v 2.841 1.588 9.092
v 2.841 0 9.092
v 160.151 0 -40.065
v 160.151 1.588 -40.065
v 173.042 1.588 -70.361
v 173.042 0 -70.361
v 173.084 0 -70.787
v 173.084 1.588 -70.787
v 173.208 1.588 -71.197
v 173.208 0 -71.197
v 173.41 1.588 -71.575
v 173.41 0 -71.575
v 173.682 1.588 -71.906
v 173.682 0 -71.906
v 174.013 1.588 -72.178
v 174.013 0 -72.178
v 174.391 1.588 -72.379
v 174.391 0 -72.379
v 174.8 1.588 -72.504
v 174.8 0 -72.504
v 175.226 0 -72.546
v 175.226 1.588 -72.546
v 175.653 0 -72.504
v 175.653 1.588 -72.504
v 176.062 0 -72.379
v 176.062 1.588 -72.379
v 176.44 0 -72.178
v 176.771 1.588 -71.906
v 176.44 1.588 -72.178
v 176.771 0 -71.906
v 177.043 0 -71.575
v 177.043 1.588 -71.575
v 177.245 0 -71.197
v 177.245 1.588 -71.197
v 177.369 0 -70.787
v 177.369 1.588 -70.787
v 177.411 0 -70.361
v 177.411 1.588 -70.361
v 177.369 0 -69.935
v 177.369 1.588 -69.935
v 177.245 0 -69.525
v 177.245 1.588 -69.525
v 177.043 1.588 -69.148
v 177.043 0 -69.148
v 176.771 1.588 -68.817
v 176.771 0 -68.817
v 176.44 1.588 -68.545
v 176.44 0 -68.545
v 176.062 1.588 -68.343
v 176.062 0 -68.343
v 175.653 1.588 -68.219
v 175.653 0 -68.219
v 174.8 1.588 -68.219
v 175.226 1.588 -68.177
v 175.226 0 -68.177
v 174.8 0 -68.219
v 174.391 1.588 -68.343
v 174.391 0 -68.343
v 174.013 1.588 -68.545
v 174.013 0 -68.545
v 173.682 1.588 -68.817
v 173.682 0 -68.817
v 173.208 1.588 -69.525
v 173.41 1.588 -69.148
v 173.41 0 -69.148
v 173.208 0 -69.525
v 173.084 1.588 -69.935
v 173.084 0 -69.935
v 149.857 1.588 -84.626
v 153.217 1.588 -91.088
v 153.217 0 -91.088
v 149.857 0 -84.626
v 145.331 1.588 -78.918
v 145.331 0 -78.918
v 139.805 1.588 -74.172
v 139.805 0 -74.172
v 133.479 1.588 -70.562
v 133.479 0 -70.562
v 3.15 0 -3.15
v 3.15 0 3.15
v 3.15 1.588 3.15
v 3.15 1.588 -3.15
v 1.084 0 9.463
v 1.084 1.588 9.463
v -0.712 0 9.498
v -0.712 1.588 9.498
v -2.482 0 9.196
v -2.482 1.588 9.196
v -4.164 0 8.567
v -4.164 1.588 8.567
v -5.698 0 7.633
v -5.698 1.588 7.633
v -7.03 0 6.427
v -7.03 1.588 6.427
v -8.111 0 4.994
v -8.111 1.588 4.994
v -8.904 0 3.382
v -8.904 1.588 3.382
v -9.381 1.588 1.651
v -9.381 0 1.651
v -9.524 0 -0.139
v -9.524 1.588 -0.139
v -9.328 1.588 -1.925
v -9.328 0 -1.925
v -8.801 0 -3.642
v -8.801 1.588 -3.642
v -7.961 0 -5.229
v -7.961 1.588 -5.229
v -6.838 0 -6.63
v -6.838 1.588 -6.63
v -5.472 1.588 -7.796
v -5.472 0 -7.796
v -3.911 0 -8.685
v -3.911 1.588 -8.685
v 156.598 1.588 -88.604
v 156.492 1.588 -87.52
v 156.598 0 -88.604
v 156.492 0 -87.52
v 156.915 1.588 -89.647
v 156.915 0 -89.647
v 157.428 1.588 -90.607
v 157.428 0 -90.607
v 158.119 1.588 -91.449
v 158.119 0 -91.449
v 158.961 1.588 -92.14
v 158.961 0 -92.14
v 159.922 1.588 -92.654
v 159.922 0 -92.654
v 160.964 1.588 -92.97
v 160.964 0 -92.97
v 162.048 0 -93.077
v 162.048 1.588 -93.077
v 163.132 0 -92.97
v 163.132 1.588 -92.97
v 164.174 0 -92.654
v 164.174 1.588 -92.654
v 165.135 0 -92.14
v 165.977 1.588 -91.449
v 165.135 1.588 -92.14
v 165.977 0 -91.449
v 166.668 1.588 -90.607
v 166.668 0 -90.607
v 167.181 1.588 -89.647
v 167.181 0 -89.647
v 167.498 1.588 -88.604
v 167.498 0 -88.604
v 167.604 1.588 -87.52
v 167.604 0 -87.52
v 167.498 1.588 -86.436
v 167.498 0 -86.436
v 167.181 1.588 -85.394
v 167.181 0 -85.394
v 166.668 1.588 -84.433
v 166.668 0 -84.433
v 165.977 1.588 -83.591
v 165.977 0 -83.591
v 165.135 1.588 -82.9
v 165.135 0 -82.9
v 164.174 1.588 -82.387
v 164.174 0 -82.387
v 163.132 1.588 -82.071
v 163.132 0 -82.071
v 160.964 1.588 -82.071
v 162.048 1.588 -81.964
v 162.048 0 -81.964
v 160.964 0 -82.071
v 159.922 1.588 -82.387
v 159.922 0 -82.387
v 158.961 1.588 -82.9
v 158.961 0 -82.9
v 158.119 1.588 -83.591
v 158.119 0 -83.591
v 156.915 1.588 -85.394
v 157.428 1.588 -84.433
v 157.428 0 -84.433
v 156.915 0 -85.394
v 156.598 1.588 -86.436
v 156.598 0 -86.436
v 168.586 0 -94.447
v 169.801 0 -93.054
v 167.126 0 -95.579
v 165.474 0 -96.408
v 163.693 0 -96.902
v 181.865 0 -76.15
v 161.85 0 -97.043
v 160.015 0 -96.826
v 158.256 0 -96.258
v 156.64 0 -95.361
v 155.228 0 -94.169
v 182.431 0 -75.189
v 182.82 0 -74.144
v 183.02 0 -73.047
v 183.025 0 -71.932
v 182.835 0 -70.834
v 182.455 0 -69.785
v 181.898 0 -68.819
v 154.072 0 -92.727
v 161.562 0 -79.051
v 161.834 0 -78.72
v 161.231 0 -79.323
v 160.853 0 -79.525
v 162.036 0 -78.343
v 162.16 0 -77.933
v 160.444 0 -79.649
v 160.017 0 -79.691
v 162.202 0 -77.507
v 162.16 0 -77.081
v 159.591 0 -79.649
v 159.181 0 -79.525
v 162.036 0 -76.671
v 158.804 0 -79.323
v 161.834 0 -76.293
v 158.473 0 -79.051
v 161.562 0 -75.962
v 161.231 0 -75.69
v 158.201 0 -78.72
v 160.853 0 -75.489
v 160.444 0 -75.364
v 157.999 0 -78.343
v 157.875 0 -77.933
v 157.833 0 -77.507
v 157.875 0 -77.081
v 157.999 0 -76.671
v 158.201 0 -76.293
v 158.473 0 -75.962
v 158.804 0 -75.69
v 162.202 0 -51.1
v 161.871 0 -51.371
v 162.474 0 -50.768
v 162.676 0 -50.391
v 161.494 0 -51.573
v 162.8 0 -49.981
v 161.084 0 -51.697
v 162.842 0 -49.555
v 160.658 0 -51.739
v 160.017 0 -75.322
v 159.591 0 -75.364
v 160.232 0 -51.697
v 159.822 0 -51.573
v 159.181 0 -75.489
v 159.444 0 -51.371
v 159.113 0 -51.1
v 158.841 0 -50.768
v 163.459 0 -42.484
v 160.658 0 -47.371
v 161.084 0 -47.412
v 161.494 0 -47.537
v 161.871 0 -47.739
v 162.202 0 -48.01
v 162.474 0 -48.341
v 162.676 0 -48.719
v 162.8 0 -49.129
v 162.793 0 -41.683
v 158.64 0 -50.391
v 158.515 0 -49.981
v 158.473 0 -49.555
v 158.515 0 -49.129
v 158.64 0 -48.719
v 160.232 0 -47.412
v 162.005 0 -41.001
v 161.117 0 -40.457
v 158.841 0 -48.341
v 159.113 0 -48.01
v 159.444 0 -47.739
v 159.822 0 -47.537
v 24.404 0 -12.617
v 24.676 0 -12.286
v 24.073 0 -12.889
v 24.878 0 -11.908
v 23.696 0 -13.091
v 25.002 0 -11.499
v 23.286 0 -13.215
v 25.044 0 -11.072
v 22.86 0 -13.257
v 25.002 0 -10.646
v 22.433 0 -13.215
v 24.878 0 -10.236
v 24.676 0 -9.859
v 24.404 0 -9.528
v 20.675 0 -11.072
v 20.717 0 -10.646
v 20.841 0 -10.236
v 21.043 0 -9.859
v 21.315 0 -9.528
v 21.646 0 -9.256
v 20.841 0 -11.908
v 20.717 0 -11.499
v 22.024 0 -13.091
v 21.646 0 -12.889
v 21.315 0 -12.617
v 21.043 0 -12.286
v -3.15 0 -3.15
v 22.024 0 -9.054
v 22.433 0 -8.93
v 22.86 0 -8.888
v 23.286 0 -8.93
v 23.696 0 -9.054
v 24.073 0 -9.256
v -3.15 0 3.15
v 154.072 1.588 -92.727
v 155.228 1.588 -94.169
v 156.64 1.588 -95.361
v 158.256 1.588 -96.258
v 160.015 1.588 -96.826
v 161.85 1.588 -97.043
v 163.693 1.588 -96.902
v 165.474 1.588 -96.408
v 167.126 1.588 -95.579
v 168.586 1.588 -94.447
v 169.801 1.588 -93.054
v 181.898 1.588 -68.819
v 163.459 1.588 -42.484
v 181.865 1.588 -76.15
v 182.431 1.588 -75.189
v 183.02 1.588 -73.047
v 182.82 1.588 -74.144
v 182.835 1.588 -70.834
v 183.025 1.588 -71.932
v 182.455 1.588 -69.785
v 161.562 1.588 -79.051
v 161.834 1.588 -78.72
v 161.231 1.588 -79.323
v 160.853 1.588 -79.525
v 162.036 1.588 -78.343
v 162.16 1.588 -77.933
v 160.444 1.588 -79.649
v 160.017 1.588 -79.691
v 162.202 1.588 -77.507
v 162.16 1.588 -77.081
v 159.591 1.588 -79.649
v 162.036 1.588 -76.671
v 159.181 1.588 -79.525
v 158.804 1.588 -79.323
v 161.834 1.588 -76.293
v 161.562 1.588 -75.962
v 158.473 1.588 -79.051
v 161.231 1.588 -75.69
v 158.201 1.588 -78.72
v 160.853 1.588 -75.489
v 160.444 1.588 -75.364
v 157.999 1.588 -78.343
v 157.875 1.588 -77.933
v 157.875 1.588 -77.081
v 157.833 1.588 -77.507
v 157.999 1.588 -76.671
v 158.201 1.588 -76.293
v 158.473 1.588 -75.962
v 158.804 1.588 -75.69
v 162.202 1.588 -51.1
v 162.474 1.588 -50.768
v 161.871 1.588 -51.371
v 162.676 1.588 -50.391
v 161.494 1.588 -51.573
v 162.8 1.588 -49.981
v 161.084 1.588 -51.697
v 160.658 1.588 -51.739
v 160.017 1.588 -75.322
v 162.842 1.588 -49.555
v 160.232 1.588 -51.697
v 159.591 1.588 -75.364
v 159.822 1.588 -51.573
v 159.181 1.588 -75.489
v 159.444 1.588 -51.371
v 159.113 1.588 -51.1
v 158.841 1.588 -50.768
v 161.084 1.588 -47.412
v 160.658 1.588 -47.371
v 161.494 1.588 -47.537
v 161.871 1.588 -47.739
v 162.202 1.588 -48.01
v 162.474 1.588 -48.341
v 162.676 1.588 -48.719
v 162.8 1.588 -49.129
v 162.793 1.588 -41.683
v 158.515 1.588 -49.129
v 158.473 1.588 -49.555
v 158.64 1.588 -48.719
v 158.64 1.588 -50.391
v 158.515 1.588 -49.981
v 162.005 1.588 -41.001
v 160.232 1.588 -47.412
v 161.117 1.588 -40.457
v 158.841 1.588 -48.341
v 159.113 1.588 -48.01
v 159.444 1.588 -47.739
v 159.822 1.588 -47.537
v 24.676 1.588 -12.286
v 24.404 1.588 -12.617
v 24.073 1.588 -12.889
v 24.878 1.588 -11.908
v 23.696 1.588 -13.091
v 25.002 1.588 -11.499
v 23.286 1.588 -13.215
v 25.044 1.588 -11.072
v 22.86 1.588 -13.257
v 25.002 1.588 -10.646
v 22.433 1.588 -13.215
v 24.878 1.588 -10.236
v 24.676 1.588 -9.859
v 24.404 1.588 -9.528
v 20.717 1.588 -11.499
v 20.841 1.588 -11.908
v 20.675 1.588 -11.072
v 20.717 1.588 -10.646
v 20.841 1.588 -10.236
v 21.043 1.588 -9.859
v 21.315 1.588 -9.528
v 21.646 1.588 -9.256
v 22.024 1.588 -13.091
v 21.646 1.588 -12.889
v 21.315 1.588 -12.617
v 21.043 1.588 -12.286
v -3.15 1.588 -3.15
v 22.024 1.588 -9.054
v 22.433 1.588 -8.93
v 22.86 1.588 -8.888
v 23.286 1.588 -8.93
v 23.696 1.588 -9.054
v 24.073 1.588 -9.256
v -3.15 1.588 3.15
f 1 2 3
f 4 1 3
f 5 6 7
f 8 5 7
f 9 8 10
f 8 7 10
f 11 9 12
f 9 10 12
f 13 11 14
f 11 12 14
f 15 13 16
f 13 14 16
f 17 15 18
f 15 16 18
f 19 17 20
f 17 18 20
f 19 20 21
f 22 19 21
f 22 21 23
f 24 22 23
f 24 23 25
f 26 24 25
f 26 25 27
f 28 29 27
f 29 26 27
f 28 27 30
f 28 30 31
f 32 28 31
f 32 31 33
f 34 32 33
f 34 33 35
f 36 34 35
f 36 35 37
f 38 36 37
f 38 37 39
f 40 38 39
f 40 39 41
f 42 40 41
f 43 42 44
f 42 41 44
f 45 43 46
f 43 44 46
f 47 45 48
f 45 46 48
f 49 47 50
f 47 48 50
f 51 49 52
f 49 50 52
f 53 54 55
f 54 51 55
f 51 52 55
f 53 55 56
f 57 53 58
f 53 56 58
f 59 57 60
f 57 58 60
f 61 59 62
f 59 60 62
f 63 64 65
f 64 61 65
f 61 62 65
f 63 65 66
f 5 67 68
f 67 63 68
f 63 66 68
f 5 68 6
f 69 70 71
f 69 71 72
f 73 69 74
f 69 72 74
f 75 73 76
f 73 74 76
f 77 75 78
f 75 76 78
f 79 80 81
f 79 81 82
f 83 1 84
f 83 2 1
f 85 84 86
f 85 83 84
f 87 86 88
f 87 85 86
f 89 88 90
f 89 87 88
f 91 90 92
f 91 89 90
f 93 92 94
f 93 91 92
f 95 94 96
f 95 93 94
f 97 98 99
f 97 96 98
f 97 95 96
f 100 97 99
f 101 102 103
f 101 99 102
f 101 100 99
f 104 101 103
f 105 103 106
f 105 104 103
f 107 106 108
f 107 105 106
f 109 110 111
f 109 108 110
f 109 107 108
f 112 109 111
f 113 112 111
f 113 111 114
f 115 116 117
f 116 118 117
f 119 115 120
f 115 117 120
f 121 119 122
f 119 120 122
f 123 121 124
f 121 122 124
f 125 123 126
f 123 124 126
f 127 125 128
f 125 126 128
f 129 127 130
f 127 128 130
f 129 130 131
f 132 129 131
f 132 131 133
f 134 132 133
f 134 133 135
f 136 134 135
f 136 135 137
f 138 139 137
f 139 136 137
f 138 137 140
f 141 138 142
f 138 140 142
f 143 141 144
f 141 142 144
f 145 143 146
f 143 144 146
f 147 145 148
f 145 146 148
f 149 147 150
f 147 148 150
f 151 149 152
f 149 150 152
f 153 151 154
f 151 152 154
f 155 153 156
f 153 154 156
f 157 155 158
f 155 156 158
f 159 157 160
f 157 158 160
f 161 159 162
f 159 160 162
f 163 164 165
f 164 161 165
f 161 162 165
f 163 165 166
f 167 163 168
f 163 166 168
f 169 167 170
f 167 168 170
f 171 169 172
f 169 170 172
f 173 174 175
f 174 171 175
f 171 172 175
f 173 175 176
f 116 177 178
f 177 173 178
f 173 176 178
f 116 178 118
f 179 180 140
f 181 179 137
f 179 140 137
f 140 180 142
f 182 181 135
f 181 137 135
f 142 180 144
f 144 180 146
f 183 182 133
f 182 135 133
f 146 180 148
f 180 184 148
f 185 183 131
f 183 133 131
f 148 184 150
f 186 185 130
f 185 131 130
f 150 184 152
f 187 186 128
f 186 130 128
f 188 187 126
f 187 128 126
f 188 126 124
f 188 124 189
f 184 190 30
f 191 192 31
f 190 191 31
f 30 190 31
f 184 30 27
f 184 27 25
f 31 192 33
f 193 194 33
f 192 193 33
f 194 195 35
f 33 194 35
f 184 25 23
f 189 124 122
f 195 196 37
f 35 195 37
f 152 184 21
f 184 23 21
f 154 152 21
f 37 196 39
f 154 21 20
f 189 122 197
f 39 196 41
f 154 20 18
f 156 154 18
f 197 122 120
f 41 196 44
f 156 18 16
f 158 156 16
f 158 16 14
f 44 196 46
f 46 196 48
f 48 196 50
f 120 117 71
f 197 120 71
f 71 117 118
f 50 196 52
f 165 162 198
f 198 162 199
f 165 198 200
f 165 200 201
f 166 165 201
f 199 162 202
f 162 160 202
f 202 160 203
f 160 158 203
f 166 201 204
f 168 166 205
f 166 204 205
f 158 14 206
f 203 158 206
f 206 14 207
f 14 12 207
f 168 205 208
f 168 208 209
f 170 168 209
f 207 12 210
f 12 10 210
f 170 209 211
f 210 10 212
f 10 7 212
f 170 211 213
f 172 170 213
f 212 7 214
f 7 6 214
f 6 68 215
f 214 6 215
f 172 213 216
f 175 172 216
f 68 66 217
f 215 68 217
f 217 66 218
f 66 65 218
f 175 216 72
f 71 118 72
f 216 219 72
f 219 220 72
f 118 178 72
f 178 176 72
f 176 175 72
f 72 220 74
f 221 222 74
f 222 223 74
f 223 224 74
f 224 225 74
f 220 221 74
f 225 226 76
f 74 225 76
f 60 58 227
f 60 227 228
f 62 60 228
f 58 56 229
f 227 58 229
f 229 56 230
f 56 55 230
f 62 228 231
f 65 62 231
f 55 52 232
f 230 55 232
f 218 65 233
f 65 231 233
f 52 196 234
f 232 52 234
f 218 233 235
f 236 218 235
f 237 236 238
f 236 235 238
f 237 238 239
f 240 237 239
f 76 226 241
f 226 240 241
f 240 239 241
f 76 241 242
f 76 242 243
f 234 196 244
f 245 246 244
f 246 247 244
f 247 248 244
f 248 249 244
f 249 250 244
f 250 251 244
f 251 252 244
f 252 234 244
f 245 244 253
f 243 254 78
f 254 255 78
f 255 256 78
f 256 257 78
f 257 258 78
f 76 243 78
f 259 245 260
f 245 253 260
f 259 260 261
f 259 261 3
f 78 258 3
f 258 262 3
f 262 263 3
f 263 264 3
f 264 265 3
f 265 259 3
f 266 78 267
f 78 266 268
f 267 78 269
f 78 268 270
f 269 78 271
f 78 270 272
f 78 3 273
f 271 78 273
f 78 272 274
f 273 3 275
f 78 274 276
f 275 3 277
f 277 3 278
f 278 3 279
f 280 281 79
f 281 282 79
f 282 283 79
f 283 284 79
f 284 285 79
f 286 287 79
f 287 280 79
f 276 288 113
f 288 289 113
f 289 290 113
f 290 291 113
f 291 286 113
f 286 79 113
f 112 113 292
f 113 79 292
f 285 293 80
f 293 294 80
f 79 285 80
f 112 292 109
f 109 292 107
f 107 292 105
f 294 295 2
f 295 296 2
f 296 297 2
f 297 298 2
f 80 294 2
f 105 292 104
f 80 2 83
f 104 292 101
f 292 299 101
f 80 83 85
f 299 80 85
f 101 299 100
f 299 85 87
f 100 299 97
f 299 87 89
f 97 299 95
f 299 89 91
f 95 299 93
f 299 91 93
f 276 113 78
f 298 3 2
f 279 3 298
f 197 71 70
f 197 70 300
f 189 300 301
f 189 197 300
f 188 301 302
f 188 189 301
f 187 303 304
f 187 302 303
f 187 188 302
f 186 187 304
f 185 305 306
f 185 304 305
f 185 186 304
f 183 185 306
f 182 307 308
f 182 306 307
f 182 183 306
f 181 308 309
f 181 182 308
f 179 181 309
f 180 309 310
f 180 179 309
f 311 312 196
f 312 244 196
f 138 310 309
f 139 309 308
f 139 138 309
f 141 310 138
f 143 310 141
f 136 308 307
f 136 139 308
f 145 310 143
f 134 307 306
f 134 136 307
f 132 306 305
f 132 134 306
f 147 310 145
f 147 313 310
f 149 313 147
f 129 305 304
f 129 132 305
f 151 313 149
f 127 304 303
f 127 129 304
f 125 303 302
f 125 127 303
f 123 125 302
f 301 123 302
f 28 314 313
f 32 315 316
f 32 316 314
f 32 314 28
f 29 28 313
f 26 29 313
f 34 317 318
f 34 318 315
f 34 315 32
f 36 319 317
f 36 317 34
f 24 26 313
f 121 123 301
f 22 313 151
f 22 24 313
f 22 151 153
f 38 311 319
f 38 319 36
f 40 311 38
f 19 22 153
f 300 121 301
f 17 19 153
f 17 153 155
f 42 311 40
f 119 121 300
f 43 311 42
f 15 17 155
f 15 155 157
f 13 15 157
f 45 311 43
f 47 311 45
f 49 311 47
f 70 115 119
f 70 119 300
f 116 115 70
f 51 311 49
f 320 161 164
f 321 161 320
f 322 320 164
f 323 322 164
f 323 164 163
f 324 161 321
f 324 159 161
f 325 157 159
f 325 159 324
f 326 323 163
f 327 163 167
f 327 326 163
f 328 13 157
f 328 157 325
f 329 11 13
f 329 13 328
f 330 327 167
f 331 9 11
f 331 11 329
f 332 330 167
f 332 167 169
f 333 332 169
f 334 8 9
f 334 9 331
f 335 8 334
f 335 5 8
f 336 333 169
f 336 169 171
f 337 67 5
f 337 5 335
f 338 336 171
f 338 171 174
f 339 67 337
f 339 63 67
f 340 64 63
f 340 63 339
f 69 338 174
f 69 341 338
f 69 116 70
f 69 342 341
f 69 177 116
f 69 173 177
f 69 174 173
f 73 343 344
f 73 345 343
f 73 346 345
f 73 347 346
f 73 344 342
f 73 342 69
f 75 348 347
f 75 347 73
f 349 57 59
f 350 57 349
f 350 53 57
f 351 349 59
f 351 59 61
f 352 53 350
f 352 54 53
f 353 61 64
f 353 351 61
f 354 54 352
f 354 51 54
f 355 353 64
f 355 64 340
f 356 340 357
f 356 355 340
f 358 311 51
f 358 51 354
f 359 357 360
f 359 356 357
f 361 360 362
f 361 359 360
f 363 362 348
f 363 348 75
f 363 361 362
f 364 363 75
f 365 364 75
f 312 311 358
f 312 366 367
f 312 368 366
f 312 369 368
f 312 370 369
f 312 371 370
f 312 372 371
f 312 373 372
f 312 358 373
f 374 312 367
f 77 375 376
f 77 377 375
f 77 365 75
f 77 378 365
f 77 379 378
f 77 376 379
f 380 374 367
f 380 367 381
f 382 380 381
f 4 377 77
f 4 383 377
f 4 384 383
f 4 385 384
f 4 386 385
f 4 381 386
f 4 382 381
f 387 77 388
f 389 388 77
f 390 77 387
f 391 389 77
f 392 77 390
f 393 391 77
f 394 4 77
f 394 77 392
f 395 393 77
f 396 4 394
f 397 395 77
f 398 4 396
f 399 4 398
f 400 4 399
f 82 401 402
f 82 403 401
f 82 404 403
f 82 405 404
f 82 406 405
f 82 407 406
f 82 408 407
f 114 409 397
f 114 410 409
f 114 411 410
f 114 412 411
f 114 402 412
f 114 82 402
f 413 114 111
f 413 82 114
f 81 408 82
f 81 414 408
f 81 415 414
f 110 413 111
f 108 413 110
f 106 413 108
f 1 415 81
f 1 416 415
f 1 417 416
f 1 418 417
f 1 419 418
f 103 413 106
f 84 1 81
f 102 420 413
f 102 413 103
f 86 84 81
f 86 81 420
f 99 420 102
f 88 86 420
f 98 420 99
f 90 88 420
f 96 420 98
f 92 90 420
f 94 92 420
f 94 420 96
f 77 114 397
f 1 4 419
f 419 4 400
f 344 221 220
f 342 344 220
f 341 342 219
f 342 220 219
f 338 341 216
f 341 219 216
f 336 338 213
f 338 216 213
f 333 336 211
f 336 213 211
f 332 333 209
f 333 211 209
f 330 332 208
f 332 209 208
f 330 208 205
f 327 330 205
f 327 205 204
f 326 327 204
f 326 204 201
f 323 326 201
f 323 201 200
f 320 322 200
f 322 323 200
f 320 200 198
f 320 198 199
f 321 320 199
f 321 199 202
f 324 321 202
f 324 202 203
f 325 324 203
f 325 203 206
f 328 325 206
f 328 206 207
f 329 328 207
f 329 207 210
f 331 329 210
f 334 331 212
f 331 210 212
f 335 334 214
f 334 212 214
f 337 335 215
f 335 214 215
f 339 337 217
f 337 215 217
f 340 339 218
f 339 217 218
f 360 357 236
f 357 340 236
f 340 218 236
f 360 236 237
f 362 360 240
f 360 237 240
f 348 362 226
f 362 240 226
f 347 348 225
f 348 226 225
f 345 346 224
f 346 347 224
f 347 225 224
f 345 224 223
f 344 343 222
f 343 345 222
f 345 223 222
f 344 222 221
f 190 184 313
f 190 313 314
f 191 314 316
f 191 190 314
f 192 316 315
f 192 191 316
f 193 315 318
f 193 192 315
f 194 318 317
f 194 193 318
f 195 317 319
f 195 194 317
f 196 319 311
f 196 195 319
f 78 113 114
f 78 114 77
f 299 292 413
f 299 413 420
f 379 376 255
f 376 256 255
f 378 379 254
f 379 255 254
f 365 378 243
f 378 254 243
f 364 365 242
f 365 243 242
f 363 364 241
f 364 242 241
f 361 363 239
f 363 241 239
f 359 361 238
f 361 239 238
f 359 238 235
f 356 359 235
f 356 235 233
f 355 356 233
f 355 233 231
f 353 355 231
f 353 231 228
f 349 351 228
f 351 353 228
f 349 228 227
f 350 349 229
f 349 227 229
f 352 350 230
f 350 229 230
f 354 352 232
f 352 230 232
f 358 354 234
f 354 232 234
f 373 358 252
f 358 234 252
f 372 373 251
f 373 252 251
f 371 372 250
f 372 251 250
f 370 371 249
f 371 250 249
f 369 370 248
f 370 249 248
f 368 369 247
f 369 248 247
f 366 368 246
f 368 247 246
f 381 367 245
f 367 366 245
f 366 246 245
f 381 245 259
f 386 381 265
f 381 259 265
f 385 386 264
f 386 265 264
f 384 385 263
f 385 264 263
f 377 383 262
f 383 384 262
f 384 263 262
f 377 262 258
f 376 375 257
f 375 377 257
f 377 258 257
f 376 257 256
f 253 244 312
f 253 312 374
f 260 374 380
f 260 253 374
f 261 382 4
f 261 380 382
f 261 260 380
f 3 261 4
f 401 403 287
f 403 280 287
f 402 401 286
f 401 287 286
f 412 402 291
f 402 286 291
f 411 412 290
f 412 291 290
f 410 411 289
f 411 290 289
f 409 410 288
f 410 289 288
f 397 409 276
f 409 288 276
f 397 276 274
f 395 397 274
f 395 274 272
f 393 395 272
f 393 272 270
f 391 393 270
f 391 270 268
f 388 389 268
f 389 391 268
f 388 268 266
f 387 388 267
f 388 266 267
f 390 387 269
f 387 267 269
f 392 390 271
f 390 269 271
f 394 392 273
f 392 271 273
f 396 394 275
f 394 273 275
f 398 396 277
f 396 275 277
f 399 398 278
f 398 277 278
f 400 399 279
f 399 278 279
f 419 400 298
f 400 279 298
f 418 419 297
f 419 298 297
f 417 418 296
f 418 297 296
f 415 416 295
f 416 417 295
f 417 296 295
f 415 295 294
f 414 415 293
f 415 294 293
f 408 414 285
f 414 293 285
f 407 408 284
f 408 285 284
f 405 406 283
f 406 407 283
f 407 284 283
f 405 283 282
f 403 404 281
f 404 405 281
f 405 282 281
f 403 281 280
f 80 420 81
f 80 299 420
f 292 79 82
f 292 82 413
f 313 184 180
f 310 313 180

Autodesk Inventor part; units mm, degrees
ref_plane "YZ Plane" through (0, 0, 0) normal (1, 0, 0) x (0, 1, 0)
ref_plane "XZ Plane" through (0, 0, 0) normal (0, 1, 0) x (-1, 0, 0)
ref_plane "XY Plane" through (0, 0, 0) normal (0, 0, 1) x (1, 0, 0)
sketch "main" plane through (0, 0, 0) normal (0, 0, 1) x (1, 0, 0)
  arc A0 (-76.9765, 33.0075) -> (-80.2841, 30.5888) centre (-75.0825, 26.9465) ccw
  circle A1 centre (-77.4831, 23.5181) radius 2.1844
  circle A2 centre (-76.8428, -4.4337) radius 2.1844
  arc A3 (-57.2294, -80.4633) -> (-56.4581, -83.5168) centre (-56.6485, -81.9407) ccw
  circle A4 centre (-92.052, 2.7116) radius 2.1844
  circle A5 centre (-78.8735, -14.4473) radius 5.5563
  line L0 (-80.2841, 30.5888) -> (-98.7239, 4.254)
  arc A6 (-98.7239, 4.254) -> (-98.6909, -3.0772) centre (-93.5223, 0.6117) ccw
  arc A7 (-86.6264, -19.9807) -> (-70.0421, -18.0155) centre (-78.8735, -14.4473) ccw
  line L1 (-98.6909, -3.0772) -> (-86.6264, -19.9807)
  arc A8 (87.0859, 64.3881) -> (80.3336, 82.1644) centre (83.1745, 73.0729) ccw
  line L2 (86.3241, 76.2225) -> (80.0249, 76.2225)
  line L3 (80.0249, 76.2225) -> (80.0249, 69.9233)
  line L4 (80.0249, 69.9233) -> (86.3241, 69.9233)
  line L5 (86.3241, 69.9233) -> (86.3241, 76.2225)
  line L6 (86.3241, 76.2225) -> (80.0249, 69.9233) construction
  line L7 (80.0249, 76.2225) -> (86.3241, 69.9233) construction
  circle A9 centre (60.3149, 62.0006) radius 2.1844
  line L8 (87.0859, 64.3881) -> (-50.3044, 2.5112)
  arc A10 (-50.3044, 2.5112) -> (-70.0421, -18.0155) centre (-34.6127, -32.3302) ccw
  line L9 (80.3336, 82.1644) -> (-76.9765, 33.0075)
  point P0 (-51.4681, 8.9463)
  point P1 (-79.4455, 31.7864)
  point P2 (-101.2988, 0.5767)
  dimension "d4" = 11.1125
  dimension "d5" = 19.05
  dimension "d6" = 19.05
  dimension "d7" = 38.1
  dimension "d8" = 4.3688
  dimension "d9" = 6.35
  dimension "d10" = 25.4
  dimension "d11" = 6.35
  dimension "d13" = 4.3688
  dimension "d20" = 6.2992
  dimension "d21" = 6.2992
  dimension "d24" = 4.3688
  dimension "d25" = 25.4
sketch "Sketch1" plane through (0, 0, 0) normal (0, 1, 0) x (-1, 0, 0)
  arc A0 (-160.151, -40.0654) -> (-163.4586, -42.4842) centre (-158.257, -46.1264) ccw
  circle A1 centre (-160.6577, -49.5549) radius 2.1844
  circle A2 centre (-160.0174, -77.5067) radius 2.1844
  arc A3 (-140.4039, -153.5363) -> (-139.6326, -156.5897) centre (-139.823, -155.0137) ccw
  circle A4 centre (-175.2265, -70.3613) radius 2.1844
  circle A5 centre (-162.048, -87.5202) radius 5.5563
  line L0 (-163.4586, -42.4842) -> (-181.8985, -68.819)
  arc A6 (-181.8985, -68.819) -> (-181.8654, -76.1501) centre (-176.6968, -72.4612) ccw
  arc A7 (-169.8009, -93.0537) -> (-153.2166, -91.0884) centre (-162.048, -87.5202) ccw
  line L1 (-181.8654, -76.1501) -> (-169.8009, -93.0537)
  arc A8 (3.9114, -8.6848) -> (-2.8409, 9.0915) centre (0, 0) ccw
  line L2 (3.1496, 3.1496) -> (-3.1496, 3.1496)
  line L3 (-3.1496, 3.1496) -> (-3.1496, -3.1496)
  line L4 (-3.1496, -3.1496) -> (3.1496, -3.1496)
  line L5 (3.1496, -3.1496) -> (3.1496, 3.1496)
  line L6 (3.1496, 3.1496) -> (-3.1496, -3.1496) construction
  line L7 (-3.1496, 3.1496) -> (3.1496, -3.1496) construction
  circle A9 centre (-22.8596, -11.0724) radius 2.1844
  line L8 (3.9114, -8.6848) -> (-133.4789, -70.5617)
  arc A10 (-133.4789, -70.5617) -> (-153.2166, -91.0884) centre (-117.7873, -105.4032) ccw
  line L9 (-2.8409, 9.0915) -> (-160.151, -40.0654)
  point P0 (0, 0)
extrude "Extrusion1" add sketch "Sketch1" along normal blind 1.5875
properties part number "Gusset" material "Acetal Resin, White"
